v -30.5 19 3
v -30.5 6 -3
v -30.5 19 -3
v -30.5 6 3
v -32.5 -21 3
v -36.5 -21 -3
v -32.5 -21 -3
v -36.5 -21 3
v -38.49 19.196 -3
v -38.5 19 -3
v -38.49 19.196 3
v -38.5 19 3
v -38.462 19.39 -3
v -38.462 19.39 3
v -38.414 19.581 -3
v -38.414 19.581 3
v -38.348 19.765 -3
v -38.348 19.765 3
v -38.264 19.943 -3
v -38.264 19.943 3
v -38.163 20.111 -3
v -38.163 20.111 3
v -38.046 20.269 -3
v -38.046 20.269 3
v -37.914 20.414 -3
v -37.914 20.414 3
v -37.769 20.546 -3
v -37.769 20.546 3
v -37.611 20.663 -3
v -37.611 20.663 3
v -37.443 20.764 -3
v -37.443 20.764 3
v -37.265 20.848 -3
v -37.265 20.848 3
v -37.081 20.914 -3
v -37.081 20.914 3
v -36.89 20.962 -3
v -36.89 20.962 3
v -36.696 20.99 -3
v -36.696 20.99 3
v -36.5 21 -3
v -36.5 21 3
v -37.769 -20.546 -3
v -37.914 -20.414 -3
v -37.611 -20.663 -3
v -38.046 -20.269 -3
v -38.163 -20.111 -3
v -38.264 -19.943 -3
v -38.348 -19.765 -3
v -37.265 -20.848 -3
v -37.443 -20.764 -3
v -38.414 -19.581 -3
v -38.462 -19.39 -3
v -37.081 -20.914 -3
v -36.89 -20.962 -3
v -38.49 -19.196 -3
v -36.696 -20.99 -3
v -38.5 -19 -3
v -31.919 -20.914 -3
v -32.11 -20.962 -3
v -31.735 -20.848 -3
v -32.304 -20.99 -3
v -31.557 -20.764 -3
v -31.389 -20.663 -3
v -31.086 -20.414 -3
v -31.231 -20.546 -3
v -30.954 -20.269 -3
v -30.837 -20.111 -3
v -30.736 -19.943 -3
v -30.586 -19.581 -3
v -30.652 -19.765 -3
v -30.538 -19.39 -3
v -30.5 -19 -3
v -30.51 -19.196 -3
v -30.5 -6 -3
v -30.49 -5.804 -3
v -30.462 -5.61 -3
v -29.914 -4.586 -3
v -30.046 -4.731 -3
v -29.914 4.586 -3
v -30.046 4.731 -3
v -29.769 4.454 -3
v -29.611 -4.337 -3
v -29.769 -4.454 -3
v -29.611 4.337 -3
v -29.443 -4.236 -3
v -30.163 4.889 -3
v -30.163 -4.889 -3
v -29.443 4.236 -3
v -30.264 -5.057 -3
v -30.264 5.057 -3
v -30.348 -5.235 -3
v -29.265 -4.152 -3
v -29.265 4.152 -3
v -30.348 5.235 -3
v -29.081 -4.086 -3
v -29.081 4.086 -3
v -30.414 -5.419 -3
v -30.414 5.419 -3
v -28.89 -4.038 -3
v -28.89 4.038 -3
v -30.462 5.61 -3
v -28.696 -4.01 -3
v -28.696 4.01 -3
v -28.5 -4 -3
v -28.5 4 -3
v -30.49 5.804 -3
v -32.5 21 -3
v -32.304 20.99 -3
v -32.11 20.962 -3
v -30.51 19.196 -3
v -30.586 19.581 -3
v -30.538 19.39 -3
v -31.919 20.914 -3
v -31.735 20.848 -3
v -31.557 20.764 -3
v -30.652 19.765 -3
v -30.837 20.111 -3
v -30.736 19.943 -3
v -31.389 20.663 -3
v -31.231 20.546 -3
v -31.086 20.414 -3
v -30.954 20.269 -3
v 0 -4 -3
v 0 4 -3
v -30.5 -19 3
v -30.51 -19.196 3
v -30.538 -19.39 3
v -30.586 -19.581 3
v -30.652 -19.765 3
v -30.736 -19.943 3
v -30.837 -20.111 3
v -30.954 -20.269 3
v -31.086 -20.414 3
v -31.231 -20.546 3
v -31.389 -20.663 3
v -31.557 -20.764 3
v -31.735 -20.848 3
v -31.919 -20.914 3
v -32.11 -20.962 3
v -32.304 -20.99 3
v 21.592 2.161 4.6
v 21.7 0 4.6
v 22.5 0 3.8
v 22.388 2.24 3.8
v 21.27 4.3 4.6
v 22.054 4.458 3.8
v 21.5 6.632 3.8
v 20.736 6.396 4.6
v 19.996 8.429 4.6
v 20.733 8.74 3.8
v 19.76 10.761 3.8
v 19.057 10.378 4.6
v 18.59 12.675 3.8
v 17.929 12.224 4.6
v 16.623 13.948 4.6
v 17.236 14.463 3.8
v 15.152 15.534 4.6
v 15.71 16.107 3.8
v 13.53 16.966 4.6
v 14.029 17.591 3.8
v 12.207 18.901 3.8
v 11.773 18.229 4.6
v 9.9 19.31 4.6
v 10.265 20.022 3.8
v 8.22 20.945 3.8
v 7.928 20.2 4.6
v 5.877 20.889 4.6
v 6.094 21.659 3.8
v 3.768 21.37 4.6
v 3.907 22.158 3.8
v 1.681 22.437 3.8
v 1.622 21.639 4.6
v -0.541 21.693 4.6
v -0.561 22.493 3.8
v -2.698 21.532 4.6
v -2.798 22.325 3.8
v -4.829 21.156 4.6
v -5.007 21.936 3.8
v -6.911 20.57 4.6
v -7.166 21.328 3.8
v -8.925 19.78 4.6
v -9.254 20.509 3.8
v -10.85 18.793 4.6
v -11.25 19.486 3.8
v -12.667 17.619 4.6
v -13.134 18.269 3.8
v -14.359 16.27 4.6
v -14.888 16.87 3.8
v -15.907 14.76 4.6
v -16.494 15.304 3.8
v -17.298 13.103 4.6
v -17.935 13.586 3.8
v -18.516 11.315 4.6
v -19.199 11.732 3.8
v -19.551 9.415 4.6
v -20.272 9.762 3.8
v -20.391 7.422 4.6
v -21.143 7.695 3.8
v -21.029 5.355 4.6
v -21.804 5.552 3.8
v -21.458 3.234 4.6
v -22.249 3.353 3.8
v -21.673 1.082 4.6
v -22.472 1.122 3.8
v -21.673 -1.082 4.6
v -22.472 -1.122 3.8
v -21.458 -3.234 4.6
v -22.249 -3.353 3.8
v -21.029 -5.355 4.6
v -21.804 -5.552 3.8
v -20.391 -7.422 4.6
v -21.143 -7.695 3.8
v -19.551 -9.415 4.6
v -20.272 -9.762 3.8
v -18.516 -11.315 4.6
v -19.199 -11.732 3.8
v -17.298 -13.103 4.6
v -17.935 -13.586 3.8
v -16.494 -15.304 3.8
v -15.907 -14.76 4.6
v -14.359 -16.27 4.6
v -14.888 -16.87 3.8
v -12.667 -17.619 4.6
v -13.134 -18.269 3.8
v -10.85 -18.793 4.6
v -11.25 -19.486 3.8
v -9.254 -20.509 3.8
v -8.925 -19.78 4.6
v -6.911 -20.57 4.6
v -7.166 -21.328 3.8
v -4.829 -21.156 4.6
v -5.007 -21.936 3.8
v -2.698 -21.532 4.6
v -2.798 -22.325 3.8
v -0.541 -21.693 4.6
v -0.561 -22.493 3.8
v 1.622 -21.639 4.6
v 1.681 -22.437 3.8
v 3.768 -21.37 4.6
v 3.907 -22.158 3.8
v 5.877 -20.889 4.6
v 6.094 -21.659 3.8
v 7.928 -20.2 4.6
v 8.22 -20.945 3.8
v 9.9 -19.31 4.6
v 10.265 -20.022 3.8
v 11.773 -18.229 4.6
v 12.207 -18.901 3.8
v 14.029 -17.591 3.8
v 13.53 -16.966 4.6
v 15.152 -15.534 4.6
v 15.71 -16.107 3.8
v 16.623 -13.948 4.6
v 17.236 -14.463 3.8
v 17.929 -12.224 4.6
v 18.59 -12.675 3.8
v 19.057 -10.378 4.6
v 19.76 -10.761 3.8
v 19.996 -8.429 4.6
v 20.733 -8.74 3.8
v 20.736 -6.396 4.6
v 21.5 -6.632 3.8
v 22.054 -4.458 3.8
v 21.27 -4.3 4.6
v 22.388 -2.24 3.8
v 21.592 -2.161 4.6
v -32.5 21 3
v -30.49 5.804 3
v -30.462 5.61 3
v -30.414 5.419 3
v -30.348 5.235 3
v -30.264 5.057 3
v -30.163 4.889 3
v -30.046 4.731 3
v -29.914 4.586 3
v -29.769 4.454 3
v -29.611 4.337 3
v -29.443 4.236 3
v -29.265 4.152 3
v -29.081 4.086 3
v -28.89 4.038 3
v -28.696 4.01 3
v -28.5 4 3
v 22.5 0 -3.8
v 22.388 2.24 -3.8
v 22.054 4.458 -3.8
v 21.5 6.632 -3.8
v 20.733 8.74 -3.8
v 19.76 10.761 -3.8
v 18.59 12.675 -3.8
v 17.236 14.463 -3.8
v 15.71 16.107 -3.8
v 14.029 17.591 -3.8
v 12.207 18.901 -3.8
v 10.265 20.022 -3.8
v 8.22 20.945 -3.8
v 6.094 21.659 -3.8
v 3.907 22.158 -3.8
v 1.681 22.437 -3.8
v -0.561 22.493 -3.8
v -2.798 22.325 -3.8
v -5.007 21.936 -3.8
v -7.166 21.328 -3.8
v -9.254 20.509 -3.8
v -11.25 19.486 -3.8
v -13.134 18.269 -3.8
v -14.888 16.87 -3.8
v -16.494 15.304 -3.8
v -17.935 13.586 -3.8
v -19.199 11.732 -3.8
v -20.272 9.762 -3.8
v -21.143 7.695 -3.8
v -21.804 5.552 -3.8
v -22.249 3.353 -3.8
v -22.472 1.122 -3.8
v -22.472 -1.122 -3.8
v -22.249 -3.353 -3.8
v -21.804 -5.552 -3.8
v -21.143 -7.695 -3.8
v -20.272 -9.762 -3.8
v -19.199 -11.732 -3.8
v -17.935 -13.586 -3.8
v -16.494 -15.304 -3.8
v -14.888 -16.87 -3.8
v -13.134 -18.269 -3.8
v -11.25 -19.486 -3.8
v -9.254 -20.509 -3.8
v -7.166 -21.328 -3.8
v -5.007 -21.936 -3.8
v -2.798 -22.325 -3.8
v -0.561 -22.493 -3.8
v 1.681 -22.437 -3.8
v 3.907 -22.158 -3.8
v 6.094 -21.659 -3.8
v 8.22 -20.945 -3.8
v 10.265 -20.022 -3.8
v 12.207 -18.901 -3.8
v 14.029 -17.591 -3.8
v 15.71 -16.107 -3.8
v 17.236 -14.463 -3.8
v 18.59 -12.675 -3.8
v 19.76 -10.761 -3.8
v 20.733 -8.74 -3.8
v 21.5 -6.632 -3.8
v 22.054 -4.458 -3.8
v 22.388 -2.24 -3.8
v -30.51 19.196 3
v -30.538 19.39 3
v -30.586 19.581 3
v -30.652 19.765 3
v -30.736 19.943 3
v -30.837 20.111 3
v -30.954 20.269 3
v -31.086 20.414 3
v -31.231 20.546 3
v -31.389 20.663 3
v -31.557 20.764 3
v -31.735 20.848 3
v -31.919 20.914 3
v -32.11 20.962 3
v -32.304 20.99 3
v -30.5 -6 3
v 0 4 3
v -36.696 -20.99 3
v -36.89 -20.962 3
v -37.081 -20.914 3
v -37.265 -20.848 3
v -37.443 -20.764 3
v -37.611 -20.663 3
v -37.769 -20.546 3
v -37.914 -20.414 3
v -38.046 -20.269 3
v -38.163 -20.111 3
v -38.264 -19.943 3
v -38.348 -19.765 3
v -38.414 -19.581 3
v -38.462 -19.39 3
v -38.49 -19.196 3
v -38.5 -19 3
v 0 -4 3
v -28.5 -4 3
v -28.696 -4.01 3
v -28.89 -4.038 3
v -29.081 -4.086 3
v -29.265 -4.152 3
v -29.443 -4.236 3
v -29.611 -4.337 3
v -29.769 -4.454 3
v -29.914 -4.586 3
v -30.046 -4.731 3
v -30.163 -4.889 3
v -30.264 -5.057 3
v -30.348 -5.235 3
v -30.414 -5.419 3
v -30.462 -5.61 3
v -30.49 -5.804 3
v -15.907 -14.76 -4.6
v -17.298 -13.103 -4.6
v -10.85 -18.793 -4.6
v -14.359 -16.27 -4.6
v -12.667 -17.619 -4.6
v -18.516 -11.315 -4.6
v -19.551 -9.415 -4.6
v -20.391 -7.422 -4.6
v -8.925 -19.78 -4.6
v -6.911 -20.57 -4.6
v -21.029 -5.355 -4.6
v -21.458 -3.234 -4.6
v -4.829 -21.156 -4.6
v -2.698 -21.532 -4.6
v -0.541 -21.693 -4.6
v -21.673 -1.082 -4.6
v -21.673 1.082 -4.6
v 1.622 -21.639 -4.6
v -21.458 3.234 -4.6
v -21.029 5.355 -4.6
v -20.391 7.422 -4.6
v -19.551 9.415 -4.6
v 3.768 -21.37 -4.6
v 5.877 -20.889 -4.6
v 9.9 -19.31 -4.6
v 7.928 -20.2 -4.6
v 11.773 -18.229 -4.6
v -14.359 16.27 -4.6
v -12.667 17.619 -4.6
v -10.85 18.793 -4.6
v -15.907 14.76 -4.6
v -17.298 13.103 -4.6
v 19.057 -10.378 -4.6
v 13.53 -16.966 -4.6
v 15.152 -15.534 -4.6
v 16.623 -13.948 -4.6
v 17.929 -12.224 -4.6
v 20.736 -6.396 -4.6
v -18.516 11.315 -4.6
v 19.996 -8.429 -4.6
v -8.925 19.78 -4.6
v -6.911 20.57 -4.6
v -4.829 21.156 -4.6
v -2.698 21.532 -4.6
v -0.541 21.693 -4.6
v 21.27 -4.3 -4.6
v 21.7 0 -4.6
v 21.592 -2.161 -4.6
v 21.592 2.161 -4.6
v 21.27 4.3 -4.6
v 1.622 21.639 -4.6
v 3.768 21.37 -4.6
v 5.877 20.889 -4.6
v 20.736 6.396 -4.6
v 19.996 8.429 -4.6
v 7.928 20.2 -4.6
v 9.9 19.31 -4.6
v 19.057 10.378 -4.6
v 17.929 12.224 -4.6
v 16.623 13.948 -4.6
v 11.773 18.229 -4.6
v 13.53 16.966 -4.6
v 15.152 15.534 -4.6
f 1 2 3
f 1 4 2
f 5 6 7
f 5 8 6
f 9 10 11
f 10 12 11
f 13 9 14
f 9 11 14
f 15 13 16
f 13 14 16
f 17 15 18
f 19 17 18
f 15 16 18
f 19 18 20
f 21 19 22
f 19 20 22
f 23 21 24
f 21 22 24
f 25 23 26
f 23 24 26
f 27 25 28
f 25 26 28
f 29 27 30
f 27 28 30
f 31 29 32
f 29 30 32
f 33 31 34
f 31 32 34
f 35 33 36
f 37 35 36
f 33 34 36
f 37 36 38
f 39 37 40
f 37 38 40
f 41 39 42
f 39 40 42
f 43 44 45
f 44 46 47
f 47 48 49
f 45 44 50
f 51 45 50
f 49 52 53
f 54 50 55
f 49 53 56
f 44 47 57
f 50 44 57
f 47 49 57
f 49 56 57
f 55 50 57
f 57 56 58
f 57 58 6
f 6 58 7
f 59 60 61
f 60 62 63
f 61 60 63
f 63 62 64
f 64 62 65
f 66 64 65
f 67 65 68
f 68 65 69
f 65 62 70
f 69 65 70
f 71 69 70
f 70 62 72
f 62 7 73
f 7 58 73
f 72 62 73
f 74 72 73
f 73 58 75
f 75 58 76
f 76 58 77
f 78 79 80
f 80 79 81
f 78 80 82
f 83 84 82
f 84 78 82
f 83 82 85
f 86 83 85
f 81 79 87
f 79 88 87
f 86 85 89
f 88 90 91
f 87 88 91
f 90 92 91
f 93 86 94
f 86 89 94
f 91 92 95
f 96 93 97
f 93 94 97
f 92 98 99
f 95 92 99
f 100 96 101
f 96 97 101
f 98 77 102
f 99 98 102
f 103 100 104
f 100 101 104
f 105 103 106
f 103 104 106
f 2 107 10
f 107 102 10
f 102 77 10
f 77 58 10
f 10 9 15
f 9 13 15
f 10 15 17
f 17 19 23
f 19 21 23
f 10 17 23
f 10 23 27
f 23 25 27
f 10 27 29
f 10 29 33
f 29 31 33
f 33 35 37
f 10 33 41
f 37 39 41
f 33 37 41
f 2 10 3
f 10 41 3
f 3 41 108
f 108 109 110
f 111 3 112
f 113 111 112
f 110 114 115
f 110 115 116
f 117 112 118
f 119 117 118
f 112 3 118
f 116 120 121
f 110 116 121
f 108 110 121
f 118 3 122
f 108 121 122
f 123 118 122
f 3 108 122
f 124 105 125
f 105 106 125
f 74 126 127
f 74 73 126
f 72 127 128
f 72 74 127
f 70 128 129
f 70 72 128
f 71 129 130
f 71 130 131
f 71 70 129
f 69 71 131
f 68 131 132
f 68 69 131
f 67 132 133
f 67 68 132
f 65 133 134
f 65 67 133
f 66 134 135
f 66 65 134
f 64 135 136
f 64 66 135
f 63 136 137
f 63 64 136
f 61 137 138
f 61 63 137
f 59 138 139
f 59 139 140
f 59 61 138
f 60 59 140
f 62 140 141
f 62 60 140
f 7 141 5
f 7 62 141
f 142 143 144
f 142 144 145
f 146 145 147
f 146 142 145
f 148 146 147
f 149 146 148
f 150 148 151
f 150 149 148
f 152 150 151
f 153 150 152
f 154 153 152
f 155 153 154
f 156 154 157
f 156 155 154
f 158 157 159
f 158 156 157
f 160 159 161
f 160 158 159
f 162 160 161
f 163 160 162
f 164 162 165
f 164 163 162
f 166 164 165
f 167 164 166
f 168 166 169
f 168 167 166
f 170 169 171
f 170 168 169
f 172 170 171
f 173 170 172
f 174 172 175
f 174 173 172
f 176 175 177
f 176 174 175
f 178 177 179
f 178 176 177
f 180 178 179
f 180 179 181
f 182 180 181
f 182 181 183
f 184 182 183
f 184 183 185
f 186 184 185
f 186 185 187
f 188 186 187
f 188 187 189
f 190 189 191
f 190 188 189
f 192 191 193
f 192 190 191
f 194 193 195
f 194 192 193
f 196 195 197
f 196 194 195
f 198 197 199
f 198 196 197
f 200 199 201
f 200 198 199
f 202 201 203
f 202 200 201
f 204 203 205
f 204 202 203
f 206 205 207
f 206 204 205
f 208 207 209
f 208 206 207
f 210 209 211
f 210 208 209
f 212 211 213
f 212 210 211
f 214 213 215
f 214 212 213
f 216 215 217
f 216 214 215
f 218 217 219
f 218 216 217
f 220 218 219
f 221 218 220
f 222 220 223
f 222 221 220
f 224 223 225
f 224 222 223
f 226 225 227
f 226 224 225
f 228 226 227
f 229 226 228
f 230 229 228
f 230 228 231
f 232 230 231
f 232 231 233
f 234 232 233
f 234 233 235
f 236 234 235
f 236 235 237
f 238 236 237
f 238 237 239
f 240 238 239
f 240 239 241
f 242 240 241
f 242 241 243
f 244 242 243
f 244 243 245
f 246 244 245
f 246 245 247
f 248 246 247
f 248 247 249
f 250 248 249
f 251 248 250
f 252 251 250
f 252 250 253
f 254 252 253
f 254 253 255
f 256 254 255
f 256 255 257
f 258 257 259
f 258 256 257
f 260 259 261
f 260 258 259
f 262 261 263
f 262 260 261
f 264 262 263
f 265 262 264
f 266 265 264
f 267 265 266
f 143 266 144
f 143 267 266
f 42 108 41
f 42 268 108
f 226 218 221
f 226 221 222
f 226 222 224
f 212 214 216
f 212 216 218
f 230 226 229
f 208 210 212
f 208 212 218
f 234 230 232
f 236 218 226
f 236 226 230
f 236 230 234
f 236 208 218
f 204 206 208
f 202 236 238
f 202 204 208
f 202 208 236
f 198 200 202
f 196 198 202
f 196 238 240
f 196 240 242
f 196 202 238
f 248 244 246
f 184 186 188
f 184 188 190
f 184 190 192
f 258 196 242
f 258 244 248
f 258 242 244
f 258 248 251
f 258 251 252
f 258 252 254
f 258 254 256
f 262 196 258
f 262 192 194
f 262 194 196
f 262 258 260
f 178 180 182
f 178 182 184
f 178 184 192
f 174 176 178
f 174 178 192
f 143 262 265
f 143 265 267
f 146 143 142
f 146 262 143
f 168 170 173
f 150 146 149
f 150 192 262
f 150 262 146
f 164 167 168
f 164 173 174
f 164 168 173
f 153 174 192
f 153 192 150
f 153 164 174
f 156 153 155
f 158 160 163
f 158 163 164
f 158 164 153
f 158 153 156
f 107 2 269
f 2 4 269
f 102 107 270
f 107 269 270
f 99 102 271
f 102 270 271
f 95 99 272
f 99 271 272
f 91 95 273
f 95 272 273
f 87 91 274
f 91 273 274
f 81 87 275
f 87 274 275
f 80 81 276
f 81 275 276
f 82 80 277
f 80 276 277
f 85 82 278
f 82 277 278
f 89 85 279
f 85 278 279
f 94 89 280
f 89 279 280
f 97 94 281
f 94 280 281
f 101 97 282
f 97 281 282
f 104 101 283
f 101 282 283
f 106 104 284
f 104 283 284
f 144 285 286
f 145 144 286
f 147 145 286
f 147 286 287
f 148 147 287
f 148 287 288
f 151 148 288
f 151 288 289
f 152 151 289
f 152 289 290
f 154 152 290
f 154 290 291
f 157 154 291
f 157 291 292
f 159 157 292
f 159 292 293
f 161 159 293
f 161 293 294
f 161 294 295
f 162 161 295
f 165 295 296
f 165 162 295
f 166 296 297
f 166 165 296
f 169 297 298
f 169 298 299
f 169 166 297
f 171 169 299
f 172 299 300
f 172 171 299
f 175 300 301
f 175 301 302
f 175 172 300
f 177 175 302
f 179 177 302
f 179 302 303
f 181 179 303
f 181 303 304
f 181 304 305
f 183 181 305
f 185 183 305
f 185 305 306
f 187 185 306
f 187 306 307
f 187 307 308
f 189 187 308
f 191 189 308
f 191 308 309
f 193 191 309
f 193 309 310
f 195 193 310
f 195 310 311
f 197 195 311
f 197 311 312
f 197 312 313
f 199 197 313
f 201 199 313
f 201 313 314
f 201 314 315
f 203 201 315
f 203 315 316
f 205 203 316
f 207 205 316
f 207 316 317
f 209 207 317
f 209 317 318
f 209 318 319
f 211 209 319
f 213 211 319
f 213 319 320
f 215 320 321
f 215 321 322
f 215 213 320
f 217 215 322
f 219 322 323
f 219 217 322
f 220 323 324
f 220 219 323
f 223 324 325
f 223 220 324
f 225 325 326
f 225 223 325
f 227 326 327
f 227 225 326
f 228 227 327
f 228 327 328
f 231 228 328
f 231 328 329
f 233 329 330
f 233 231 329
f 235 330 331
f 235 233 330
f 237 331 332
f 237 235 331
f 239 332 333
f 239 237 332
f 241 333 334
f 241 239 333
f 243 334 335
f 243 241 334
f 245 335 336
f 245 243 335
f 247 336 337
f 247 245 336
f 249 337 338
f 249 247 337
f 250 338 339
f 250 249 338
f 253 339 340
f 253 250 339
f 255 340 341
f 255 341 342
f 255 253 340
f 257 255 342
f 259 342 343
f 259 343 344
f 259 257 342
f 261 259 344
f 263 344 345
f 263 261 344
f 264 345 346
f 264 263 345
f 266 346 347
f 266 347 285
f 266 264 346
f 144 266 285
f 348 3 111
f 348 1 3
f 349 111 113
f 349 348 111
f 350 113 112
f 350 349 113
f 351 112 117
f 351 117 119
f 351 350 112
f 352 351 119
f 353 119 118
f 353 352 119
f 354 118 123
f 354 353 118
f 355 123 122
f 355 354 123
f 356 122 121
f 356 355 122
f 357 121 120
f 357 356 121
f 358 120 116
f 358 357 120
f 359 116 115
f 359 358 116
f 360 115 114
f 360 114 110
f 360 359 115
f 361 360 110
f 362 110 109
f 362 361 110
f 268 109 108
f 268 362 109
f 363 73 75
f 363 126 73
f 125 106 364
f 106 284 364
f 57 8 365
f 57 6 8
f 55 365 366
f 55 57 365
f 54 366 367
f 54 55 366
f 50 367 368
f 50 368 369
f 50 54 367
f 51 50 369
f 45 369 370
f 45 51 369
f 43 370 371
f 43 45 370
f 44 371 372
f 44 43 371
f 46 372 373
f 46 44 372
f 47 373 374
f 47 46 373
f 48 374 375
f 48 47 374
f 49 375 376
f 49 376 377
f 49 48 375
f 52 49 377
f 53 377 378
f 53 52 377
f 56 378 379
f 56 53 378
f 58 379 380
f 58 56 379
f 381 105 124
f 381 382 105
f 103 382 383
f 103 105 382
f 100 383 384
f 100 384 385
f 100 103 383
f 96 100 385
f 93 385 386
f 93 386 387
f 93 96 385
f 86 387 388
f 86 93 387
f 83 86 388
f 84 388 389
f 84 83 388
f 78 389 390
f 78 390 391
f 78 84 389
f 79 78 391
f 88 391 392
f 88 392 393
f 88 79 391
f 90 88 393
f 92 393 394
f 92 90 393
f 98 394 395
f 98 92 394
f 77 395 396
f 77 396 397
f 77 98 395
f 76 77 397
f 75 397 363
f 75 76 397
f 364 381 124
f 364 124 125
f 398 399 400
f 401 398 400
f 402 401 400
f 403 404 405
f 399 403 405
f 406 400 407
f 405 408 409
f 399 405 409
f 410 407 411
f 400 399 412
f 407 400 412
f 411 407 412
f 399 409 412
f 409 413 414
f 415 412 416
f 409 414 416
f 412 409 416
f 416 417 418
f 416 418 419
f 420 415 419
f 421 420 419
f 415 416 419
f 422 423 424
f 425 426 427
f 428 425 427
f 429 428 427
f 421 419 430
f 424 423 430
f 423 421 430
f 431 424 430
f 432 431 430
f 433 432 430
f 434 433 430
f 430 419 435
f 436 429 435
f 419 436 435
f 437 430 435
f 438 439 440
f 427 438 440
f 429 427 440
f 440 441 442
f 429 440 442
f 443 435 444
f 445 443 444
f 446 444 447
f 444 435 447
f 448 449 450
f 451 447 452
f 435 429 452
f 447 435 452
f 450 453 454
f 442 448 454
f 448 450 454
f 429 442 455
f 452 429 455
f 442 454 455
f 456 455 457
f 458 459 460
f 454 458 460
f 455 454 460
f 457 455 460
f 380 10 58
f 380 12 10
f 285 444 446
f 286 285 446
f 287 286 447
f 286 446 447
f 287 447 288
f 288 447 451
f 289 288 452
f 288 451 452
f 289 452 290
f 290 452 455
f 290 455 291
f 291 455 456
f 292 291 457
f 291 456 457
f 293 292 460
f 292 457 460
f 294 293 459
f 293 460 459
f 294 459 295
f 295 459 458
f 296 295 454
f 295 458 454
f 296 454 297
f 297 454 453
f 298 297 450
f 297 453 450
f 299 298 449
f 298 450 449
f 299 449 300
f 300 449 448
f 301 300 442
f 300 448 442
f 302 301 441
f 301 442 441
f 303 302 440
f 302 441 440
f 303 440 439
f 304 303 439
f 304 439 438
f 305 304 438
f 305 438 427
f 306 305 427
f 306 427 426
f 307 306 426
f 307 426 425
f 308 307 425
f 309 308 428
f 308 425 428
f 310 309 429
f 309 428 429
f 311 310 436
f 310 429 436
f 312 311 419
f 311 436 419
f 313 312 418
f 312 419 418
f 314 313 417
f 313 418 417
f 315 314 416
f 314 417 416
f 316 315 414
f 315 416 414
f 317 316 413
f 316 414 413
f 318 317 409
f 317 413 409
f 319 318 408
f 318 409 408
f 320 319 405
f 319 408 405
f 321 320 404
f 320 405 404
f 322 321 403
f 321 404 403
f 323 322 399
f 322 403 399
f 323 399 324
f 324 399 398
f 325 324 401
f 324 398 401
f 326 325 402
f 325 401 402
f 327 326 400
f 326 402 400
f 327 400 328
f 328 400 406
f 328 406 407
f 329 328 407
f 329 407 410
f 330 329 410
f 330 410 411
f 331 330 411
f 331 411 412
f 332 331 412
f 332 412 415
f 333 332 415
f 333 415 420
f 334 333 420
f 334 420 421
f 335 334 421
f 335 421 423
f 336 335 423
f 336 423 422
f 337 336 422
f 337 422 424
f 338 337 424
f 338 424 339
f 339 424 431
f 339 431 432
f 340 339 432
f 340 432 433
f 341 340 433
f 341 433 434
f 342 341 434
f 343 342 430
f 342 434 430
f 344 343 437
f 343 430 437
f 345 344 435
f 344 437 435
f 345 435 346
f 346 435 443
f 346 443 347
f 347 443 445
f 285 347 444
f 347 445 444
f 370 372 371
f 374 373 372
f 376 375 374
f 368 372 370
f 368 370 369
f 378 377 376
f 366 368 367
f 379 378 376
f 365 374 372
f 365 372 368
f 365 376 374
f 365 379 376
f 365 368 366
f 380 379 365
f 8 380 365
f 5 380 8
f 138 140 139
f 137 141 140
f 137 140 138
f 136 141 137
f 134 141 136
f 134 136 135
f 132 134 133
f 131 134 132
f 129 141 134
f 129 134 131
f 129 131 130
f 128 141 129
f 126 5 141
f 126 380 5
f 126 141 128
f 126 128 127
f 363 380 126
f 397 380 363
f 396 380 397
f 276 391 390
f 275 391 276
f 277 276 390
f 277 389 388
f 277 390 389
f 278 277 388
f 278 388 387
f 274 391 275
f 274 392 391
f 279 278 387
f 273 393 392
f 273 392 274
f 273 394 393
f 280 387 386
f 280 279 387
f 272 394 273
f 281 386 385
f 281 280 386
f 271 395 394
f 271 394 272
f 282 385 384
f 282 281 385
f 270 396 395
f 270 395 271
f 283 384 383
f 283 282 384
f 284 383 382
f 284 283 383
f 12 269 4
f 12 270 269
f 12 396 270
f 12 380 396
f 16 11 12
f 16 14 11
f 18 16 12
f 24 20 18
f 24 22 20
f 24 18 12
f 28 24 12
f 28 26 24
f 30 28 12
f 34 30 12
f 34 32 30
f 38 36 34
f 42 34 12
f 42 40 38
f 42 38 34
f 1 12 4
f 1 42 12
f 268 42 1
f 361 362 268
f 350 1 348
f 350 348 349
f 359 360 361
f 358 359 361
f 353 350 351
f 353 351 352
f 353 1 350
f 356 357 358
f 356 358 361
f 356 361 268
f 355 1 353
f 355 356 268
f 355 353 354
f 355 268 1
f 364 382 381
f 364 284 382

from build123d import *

# Parameters (mm, degrees)
F0_R          = 22.5
F1_DEPTH      = 4.6
F1_DEPTH_BACK = 4.6
F2_W          = 30.5
F2_H          = 8
F2_W_2        = 4
F3_DEPTH      = 3
F3_DEPTH_BACK = 3
F4_SIZE       = 0.8
F5_R          = 2
F6_R          = 2


with BuildPart() as f1:
    # F0 (on Top) → F1 (new body, two sides)
    with BuildSketch(Plane.XY) as f1_sk:
        Circle(F0_R)
    extrude(amount=F1_DEPTH)
    extrude(f1_sk.sketch, amount=-F1_DEPTH_BACK)

    # F4
    f4_edges = [f1.edges().sort_by_distance(p)[0] for p in [
        (-22.5, 0, 4.6),
        (-22.5, 0, -4.6),
    ]]
    chamfer(f4_edges, length=F4_SIZE)


with BuildPart() as f3:
    # F2 (on Top) → F3 (new body, two sides)
    with BuildSketch(Plane.XY) as f3_sk:
        with Locations((-15.25, 0)):
            Rectangle(F2_W, F2_H)
        Polygon((-30.5, -21), (-30.5, -4), (-34.5, -4), (-34.5, 4), (-30.5, 4), (-30.5, 21), (-38.5, 21), (-38.5, -21), align=None)
        with Locations((-32.5, 0)):
            Rectangle(F2_W_2, F2_H)
    extrude(amount=F3_DEPTH)
    extrude(f3_sk.sketch, amount=-F3_DEPTH_BACK)

    # F5
    f5_edges = [f3.edges().sort_by_distance(p)[0] for p in [
        (-30.5, -4, 0),
        (-30.5, 4, 0),
    ]]
    fillet(f5_edges, radius=F5_R)

    # F6
    f6_edges = [f3.edges().sort_by_distance(p)[0] for p in [
        (-30.5, -21, 0),
        (-38.5, -21, 0),
        (-30.5, 21, 0),
        (-38.5, 21, 0),
    ]]
    fillet(f6_edges, radius=F6_R)


solid = Compound([f1.part, f3.part])
